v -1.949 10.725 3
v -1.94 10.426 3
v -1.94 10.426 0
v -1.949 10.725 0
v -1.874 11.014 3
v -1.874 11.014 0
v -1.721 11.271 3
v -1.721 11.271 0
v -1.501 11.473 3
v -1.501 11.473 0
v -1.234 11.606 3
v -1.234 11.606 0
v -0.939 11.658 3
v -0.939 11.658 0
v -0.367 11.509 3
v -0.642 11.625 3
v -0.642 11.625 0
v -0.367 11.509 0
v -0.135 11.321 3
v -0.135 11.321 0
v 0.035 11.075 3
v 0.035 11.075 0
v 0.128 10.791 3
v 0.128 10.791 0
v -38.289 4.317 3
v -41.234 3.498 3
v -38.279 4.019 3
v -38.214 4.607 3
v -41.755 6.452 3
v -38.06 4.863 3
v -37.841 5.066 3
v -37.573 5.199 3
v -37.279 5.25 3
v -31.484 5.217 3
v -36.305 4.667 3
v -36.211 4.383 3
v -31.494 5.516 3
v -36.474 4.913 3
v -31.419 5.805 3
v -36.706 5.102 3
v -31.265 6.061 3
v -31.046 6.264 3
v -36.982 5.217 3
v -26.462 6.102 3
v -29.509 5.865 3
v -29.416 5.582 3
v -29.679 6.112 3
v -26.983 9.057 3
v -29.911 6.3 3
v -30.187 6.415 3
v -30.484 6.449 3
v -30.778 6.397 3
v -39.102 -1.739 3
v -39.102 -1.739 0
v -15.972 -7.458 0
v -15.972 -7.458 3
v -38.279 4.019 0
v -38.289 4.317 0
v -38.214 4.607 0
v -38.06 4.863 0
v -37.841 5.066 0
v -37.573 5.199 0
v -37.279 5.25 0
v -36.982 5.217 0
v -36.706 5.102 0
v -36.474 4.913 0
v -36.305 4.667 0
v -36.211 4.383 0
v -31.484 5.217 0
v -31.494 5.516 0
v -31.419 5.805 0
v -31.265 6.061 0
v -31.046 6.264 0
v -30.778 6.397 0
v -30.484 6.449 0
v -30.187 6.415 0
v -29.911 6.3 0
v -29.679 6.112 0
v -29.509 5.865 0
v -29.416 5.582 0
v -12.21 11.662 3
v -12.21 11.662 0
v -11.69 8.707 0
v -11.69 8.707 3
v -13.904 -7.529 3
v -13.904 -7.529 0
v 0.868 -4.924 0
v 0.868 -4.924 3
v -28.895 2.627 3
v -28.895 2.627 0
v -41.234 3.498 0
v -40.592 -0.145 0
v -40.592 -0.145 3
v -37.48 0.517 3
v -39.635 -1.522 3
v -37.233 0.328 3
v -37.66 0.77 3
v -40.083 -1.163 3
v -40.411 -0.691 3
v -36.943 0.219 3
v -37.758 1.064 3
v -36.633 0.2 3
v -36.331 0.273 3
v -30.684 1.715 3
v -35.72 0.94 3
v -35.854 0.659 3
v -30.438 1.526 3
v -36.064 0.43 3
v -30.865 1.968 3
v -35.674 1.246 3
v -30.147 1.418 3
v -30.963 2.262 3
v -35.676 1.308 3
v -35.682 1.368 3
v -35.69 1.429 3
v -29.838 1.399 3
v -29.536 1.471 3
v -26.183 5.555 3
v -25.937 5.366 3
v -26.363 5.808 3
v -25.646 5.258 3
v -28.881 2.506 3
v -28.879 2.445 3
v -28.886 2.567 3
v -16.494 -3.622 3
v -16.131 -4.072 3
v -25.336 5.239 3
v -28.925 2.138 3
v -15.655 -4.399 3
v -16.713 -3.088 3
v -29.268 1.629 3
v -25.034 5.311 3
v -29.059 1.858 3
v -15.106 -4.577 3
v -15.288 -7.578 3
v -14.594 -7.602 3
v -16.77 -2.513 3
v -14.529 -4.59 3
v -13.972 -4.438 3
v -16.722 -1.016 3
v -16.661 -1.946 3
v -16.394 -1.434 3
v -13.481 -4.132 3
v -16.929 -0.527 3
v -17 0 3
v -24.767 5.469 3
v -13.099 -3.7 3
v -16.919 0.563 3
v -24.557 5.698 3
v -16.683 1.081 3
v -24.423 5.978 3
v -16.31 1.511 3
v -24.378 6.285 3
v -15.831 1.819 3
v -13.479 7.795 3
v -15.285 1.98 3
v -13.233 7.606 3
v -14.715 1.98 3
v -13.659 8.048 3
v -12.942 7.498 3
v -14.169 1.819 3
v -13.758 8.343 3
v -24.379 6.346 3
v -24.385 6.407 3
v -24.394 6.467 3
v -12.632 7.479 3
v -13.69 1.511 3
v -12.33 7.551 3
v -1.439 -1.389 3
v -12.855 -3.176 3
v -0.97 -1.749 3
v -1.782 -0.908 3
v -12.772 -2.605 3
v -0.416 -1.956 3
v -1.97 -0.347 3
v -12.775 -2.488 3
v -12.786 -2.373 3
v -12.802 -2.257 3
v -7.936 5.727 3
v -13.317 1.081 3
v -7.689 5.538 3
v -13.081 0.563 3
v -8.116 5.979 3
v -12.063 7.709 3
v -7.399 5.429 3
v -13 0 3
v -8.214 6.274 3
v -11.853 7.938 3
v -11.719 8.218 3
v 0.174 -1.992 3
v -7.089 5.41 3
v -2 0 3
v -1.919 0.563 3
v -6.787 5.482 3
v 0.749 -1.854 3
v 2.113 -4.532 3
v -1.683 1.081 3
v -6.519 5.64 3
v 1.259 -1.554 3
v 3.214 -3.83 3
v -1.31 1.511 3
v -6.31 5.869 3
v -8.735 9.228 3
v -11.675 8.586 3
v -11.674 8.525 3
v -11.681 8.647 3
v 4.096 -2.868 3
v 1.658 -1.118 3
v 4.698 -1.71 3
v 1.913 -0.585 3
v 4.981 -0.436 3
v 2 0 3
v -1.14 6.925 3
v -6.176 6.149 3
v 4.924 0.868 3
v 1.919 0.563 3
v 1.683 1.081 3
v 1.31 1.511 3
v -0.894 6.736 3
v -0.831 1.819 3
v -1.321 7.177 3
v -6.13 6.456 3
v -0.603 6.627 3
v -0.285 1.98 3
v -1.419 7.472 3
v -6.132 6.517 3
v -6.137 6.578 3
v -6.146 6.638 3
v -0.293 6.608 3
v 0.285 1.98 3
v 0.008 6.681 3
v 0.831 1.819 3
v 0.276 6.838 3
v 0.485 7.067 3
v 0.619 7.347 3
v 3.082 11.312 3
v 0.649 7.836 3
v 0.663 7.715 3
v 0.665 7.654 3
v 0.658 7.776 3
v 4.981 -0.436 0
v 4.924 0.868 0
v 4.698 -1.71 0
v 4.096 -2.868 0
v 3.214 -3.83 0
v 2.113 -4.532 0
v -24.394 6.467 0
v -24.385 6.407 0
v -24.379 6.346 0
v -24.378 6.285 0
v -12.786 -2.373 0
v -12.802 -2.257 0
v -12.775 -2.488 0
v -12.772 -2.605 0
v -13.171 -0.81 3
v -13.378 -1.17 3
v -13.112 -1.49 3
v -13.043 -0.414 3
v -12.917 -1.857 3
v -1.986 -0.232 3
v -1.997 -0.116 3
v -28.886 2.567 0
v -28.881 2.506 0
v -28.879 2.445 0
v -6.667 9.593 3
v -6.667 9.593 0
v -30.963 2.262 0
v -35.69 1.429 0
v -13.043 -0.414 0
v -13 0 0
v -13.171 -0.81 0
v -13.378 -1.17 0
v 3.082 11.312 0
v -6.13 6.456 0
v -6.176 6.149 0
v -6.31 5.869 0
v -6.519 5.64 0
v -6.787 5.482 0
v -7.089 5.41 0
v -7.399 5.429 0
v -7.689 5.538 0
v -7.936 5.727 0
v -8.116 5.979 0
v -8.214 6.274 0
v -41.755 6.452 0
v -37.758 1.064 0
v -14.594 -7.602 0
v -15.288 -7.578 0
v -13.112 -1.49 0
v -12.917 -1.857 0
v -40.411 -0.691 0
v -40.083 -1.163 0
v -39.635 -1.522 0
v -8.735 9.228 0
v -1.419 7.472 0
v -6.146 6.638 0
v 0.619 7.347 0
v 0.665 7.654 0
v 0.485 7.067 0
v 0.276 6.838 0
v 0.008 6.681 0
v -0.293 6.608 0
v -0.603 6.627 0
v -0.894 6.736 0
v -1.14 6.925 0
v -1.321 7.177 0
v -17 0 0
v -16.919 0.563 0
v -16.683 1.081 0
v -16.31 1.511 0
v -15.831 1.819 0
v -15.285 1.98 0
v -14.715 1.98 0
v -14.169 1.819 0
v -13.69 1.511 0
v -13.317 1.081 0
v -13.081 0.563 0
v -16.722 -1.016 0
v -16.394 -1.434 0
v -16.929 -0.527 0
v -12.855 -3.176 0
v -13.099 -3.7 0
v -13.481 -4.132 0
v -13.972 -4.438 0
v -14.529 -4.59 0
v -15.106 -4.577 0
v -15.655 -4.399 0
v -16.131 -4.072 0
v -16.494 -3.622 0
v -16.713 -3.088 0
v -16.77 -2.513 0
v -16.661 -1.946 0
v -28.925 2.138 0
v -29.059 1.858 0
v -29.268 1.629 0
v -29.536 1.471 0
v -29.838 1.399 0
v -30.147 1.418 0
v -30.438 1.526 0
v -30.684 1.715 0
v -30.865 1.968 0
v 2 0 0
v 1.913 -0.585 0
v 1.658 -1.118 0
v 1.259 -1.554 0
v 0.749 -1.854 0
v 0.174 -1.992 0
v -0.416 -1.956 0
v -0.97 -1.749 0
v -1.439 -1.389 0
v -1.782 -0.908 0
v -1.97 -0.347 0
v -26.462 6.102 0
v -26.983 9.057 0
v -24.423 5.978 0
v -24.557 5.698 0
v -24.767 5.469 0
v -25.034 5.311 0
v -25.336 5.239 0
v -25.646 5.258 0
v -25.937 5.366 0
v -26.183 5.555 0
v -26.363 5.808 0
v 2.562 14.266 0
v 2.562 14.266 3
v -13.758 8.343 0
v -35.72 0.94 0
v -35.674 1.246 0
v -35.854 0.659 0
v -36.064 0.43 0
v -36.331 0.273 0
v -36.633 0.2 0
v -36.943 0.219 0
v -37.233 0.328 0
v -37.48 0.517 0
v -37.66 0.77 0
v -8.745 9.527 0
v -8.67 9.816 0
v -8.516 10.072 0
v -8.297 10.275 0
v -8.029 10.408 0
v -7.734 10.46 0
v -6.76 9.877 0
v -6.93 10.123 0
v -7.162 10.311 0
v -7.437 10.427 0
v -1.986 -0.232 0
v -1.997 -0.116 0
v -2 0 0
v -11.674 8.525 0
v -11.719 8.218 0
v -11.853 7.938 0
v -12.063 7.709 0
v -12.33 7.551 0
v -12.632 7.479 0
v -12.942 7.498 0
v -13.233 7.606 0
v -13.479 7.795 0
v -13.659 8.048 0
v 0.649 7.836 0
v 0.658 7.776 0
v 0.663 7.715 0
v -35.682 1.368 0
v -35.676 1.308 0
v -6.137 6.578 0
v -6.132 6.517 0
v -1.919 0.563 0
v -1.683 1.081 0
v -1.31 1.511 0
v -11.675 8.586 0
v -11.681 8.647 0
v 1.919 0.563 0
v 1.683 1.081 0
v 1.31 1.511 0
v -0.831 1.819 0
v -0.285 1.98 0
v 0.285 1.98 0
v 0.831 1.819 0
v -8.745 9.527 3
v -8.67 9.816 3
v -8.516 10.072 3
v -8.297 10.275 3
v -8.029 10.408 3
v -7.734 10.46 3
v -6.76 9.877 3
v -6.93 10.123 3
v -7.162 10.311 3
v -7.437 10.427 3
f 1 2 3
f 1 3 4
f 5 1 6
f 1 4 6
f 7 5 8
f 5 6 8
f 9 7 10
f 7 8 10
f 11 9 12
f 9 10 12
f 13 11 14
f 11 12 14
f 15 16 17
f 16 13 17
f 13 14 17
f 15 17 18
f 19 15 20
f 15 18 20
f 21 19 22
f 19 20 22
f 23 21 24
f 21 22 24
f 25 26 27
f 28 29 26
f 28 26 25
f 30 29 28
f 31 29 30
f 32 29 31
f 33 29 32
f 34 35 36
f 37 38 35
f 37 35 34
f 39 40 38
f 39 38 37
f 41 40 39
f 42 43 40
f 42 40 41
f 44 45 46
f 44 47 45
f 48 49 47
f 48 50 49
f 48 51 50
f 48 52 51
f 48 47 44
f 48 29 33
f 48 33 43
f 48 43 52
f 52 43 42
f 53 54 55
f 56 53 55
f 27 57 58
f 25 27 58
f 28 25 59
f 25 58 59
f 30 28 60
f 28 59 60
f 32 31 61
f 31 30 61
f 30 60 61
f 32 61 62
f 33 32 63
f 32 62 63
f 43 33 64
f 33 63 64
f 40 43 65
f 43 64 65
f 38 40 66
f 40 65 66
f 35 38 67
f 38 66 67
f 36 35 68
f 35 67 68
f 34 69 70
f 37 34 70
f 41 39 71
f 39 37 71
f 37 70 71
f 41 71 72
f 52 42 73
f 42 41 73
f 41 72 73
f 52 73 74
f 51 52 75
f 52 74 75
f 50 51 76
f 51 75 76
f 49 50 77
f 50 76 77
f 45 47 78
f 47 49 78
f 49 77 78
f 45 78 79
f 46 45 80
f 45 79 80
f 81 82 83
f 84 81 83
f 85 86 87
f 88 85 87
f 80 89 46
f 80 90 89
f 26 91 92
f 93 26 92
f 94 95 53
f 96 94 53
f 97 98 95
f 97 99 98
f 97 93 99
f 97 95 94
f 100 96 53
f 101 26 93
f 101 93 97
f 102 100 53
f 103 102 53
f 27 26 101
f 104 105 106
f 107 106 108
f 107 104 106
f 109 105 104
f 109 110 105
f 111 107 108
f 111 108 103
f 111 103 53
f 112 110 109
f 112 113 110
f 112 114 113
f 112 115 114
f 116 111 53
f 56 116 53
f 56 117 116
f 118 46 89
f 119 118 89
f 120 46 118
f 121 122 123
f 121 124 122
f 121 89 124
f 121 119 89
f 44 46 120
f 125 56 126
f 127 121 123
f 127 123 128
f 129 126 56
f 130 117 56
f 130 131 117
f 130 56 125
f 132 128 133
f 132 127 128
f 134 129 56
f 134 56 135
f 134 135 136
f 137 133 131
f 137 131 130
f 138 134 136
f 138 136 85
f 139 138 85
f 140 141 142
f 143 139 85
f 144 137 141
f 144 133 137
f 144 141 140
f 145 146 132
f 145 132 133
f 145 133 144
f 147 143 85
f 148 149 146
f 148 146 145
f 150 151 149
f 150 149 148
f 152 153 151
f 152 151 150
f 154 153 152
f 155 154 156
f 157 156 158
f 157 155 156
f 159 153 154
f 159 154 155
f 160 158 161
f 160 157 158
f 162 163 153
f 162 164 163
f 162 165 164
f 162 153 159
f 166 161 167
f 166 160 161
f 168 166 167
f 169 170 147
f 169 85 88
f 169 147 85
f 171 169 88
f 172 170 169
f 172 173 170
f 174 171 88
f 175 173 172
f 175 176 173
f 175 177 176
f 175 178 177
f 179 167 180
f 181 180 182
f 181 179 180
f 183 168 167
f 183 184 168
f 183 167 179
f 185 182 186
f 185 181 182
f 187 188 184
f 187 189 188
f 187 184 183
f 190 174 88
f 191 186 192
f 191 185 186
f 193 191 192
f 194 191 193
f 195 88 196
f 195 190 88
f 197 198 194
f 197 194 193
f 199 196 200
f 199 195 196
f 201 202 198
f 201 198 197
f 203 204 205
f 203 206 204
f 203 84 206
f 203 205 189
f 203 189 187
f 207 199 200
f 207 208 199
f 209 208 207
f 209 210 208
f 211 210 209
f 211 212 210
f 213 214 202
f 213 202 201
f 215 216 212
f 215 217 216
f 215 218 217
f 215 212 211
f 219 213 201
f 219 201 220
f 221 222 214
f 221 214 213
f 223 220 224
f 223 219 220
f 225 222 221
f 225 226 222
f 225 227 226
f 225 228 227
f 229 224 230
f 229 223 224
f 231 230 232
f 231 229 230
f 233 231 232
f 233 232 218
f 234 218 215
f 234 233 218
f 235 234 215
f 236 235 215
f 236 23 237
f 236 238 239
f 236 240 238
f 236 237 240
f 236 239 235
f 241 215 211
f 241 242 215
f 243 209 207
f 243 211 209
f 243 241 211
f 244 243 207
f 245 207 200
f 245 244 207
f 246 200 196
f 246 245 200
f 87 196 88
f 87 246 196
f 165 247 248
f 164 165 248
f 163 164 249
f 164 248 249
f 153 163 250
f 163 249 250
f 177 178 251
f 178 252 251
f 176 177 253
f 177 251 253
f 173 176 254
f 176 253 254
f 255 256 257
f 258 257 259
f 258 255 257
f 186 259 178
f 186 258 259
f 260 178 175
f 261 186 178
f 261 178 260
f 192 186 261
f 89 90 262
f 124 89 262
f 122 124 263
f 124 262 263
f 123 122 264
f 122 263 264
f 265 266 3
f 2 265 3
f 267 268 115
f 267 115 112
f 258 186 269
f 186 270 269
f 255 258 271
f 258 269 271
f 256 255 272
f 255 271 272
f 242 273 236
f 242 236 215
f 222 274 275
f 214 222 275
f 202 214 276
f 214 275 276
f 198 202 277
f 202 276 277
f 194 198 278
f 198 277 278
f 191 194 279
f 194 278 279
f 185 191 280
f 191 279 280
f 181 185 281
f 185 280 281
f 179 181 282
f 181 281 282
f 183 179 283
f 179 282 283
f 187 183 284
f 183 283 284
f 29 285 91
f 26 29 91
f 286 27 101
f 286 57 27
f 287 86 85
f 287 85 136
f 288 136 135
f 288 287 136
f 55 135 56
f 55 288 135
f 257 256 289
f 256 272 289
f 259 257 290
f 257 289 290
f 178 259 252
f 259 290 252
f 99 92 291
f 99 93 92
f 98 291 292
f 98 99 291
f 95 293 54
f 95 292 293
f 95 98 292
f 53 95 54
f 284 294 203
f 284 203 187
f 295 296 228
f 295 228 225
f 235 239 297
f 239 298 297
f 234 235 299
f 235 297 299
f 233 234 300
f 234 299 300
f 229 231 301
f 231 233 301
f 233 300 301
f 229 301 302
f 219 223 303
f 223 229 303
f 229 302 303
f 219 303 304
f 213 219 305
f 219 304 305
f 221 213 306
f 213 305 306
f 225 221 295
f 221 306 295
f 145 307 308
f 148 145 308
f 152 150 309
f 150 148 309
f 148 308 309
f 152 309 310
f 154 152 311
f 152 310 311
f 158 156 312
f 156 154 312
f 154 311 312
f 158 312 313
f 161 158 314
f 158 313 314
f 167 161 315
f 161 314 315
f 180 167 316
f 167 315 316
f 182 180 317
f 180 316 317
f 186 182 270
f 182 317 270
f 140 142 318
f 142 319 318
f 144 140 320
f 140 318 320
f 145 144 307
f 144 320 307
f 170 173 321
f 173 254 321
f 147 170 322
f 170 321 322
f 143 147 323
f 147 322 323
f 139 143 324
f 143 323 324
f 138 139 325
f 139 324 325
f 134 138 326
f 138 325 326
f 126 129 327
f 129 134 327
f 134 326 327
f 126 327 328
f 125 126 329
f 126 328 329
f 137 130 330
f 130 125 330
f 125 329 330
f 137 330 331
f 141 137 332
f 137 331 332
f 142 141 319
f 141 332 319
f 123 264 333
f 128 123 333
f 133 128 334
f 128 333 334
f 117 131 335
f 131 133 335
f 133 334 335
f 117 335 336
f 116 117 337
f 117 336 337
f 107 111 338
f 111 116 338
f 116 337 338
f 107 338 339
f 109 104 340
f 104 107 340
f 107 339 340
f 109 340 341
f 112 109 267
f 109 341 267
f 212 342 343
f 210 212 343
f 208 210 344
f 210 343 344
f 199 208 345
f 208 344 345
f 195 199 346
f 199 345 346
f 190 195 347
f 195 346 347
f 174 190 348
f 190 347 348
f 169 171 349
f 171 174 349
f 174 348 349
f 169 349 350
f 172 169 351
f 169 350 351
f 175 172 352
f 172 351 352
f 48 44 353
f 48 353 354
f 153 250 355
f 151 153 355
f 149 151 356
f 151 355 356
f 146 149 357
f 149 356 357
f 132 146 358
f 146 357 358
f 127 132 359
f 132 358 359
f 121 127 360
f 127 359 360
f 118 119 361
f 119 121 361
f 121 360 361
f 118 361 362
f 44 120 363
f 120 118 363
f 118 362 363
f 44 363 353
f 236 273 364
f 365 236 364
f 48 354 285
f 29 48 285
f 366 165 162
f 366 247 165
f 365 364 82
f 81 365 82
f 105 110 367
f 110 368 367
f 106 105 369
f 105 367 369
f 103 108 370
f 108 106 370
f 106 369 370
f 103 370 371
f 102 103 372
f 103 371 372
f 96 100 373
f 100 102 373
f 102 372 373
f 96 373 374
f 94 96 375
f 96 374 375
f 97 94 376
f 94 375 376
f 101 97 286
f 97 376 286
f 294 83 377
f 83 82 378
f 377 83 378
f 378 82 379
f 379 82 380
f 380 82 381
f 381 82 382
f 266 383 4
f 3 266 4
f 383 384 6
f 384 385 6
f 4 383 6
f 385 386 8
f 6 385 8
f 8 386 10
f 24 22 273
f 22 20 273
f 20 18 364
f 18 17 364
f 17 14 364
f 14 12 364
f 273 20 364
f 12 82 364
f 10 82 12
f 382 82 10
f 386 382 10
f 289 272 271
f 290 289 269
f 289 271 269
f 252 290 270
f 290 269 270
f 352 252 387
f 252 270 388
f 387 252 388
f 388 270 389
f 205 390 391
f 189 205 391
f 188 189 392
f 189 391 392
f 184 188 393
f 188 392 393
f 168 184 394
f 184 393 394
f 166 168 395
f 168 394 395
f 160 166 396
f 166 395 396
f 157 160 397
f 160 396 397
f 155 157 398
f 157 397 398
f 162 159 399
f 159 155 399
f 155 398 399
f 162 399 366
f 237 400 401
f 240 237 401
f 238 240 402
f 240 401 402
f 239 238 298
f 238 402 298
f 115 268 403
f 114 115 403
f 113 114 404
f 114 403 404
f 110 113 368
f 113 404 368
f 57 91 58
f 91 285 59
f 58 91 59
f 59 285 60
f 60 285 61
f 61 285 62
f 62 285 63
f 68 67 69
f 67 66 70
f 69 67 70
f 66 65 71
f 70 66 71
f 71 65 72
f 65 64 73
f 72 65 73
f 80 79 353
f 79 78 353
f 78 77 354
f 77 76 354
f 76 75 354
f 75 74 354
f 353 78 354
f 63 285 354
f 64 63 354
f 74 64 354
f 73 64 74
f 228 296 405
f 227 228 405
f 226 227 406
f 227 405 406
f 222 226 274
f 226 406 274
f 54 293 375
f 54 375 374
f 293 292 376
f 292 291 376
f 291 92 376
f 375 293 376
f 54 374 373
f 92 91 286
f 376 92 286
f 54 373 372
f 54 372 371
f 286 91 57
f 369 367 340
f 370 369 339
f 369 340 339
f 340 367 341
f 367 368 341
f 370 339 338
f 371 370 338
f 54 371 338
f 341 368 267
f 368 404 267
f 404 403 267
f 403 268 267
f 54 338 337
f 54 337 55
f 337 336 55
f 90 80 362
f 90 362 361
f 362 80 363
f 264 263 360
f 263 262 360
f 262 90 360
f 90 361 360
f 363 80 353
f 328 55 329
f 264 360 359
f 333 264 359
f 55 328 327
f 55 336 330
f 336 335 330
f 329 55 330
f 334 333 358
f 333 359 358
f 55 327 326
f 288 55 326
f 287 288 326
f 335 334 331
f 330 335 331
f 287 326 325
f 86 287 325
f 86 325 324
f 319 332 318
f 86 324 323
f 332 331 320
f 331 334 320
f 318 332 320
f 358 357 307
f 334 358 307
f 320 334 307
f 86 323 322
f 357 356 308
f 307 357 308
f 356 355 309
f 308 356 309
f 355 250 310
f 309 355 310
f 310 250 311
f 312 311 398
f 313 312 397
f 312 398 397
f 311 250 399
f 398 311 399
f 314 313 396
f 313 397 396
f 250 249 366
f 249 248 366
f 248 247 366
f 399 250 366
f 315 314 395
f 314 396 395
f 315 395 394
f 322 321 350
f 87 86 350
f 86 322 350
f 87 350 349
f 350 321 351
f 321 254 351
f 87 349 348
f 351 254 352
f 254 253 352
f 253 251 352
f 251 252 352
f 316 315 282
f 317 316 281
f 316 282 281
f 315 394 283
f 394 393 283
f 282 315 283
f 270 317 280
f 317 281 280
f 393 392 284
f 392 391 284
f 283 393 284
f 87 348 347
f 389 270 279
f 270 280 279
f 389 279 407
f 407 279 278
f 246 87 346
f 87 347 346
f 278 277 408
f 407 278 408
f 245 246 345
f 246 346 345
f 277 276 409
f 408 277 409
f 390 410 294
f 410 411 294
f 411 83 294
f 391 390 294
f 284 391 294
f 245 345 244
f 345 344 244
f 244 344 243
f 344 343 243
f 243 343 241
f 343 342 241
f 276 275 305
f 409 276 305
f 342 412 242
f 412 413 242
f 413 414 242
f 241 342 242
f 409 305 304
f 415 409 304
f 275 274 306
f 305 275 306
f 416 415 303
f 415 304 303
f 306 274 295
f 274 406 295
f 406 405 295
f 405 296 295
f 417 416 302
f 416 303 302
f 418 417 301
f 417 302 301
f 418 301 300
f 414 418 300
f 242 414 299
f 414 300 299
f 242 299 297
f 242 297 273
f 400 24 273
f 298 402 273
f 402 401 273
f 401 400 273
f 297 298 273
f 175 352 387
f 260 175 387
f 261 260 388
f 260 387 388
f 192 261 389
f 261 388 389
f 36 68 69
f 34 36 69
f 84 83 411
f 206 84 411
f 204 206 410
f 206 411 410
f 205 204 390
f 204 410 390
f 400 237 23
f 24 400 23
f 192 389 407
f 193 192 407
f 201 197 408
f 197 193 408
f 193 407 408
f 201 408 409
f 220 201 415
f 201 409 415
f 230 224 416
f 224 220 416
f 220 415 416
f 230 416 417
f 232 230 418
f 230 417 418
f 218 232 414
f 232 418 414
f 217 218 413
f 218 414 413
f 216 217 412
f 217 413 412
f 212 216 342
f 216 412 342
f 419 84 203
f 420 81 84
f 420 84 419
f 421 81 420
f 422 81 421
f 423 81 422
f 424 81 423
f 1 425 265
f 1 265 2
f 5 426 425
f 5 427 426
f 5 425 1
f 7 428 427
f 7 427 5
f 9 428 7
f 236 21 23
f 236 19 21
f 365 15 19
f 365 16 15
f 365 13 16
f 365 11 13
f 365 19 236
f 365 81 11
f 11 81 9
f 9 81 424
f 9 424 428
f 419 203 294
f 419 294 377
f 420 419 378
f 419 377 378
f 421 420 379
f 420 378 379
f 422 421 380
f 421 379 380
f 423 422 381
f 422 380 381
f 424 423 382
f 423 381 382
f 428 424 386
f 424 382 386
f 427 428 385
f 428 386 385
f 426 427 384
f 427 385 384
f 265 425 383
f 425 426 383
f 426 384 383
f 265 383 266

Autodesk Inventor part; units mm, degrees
ref_plane "YZ Plane" through (0, 0, 0) normal (1, 0, 0) x (0, 1, 0)
ref_plane "XZ Plane" through (0, 0, 0) normal (0, 1, 0) x (-1, 0, 0)
ref_plane "XY Plane" through (0, 0, 0) normal (0, 0, 1) x (1, 0, 0)
sketch "スケッチ1" plane through (0, 0, 0) normal (0, 0, 1) x (1, 0, 0)
  circle A0 centre (0, 0) radius 2
  circle A1 centre (-15, 0) radius 2
  line L0 (-41.2338, 3.4977) -> (3.0825, 11.3119)
  line L1 (-18.0894, 0) -> (0, 0)
  line L2 (3.0825, 11.3119) -> (2.5616, 14.2663)
  line L3 (2.5616, 14.2663) -> (-12.2105, 11.6616)
  line L4 (-12.2105, 11.6616) -> (-11.6896, 8.7071)
  line L5 (-26.4617, 6.1024) -> (-26.9826, 9.0568)
  line L6 (-26.9826, 9.0568) -> (-41.7547, 6.4521)
  line L7 (-41.7547, 6.4521) -> (-41.2338, 3.4977)
  line L8 (-41.2338, 3.4977) -> (-40.3656, -1.4264)
  line L9 (-40.3656, -1.4264) -> (-15.9724, -7.4585)
  arc A2 (0.8682, -4.924) -> (4.924, 0.8682) centre (0, 0) ccw
  line L10 (-13.9039, -7.5288) -> (0.8682, -4.924)
  line L11 (3.0825, 11.3119) -> (4.924, 0.8682)
  line L12 (-38.2794, 4.0186) -> (-37.7584, 1.0642)
  line L13 (-37.7584, 1.0642) -> (-28.8952, 2.627)
  line L14 (-28.8952, 2.627) -> (-29.4161, 5.5815)
  line L15 (-8.7351, 9.2281) -> (-8.2142, 6.2737)
  line L16 (-8.2142, 6.2737) -> (0.6491, 7.8365)
  line L17 (0.6491, 7.8365) -> (0.1281, 10.7909)
  circle A3 centre (-37.2453, 4.201) radius 1.05
  circle A4 centre (-30.4502, 5.3991) radius 1.05
  circle A5 centre (-29.9292, 2.4447) radius 1.05
  circle A6 centre (-36.7244, 1.2465) radius 1.05
  circle A7 centre (-7.7011, 9.4104) radius 1.05
  circle A8 centre (-0.9059, 10.6086) radius 1.05
  circle A9 centre (-0.385, 7.6542) radius 1.05
  circle A10 centre (-7.1802, 6.456) radius 1.05
  circle A11 centre (-25.4276, 6.2847) radius 1.05
  circle A12 centre (-12.7236, 8.5248) radius 1.05
  arc A13 (-15.9724, -7.4585) -> (-13.9039, -7.5288) centre (-14.7721, -2.6047) ccw
  line L18 (-14.7721, -2.6047) -> (0, 0)
  circle A14 centre (-14.7721, -2.6047) radius 2
  point P0 (-11.6896, 8.7071)
  point P1 (-13.7577, 8.3425)
  point P2 (-24.3936, 6.4671)
  point P3 (-26.4617, 6.1024)
  point P4 (-6.667, 9.5927)
  point P5 (-1.94, 10.4262)
  point P6 (0.1281, 10.7909)
  point P7 (-1.419, 7.4718)
  point P8 (-6.1461, 6.6383)
  point P9 (-8.2142, 6.2737)
  point P10 (-29.4161, 5.5815)
  point P11 (-28.8952, 2.627)
  point P12 (-30.9633, 2.2624)
  point P13 (-35.6903, 1.4289)
  point P14 (-37.7584, 1.0642)
  point P15 (-38.2794, 4.0186)
  point P16 (-36.2113, 4.3833)
  point P17 (-31.4842, 5.2168)
  point P18 (-16.3939, -1.4343)
  point P19 (-13.3783, -1.1704)
  dimension "d0" = 4
  dimension "d1" = 4
  dimension "d2" = 15
  dimension "d4" = 10
  dimension "d5" = 3
  dimension "d6" = 15
  dimension "d7" = 3
  dimension "d8" = 15
  dimension "d9" = 10
  dimension "d10" = 3
  dimension "d11" = 9
  dimension "d12" = 3
  dimension "d13" = 9
  dimension "d14" = 3
  dimension "d15" = 3
  dimension "d16" = 5
  dimension "d19" = 15
  dimension "d20" = 2.1
  dimension "d21" = 2.1
  dimension "d22" = 2.1
  dimension "d23" = 2.1
  dimension "d24" = 2.1
  dimension "d25" = 2.1
  dimension "d26" = 2.1
  dimension "d27" = 2.1
  dimension "d28" = 2.1
  dimension "d29" = 2.1
  dimension "d33" = 5
  dimension "d34" = 15
  dimension "d35" = 10
  dimension "d36" = 4
  dimension "d37" = 8
extrude "押し出し1" add sketch "スケッチ1" along normal blind 3 contours A0 L18 A14 A1 L1 | L7 L6 L5 L0 A4 A3 | L0 L12 A6 L13 A5 L14 A11 A12 L15 A10 L16 A9 L17 L11 A2 L10 A13 L9 L8 | L4 L3 L2 L0 A8 A7
fillet "フィレット1" radius 2 1 edges at (-40.3656, -1.4264, 1.5)
properties part number "シールド根本"
